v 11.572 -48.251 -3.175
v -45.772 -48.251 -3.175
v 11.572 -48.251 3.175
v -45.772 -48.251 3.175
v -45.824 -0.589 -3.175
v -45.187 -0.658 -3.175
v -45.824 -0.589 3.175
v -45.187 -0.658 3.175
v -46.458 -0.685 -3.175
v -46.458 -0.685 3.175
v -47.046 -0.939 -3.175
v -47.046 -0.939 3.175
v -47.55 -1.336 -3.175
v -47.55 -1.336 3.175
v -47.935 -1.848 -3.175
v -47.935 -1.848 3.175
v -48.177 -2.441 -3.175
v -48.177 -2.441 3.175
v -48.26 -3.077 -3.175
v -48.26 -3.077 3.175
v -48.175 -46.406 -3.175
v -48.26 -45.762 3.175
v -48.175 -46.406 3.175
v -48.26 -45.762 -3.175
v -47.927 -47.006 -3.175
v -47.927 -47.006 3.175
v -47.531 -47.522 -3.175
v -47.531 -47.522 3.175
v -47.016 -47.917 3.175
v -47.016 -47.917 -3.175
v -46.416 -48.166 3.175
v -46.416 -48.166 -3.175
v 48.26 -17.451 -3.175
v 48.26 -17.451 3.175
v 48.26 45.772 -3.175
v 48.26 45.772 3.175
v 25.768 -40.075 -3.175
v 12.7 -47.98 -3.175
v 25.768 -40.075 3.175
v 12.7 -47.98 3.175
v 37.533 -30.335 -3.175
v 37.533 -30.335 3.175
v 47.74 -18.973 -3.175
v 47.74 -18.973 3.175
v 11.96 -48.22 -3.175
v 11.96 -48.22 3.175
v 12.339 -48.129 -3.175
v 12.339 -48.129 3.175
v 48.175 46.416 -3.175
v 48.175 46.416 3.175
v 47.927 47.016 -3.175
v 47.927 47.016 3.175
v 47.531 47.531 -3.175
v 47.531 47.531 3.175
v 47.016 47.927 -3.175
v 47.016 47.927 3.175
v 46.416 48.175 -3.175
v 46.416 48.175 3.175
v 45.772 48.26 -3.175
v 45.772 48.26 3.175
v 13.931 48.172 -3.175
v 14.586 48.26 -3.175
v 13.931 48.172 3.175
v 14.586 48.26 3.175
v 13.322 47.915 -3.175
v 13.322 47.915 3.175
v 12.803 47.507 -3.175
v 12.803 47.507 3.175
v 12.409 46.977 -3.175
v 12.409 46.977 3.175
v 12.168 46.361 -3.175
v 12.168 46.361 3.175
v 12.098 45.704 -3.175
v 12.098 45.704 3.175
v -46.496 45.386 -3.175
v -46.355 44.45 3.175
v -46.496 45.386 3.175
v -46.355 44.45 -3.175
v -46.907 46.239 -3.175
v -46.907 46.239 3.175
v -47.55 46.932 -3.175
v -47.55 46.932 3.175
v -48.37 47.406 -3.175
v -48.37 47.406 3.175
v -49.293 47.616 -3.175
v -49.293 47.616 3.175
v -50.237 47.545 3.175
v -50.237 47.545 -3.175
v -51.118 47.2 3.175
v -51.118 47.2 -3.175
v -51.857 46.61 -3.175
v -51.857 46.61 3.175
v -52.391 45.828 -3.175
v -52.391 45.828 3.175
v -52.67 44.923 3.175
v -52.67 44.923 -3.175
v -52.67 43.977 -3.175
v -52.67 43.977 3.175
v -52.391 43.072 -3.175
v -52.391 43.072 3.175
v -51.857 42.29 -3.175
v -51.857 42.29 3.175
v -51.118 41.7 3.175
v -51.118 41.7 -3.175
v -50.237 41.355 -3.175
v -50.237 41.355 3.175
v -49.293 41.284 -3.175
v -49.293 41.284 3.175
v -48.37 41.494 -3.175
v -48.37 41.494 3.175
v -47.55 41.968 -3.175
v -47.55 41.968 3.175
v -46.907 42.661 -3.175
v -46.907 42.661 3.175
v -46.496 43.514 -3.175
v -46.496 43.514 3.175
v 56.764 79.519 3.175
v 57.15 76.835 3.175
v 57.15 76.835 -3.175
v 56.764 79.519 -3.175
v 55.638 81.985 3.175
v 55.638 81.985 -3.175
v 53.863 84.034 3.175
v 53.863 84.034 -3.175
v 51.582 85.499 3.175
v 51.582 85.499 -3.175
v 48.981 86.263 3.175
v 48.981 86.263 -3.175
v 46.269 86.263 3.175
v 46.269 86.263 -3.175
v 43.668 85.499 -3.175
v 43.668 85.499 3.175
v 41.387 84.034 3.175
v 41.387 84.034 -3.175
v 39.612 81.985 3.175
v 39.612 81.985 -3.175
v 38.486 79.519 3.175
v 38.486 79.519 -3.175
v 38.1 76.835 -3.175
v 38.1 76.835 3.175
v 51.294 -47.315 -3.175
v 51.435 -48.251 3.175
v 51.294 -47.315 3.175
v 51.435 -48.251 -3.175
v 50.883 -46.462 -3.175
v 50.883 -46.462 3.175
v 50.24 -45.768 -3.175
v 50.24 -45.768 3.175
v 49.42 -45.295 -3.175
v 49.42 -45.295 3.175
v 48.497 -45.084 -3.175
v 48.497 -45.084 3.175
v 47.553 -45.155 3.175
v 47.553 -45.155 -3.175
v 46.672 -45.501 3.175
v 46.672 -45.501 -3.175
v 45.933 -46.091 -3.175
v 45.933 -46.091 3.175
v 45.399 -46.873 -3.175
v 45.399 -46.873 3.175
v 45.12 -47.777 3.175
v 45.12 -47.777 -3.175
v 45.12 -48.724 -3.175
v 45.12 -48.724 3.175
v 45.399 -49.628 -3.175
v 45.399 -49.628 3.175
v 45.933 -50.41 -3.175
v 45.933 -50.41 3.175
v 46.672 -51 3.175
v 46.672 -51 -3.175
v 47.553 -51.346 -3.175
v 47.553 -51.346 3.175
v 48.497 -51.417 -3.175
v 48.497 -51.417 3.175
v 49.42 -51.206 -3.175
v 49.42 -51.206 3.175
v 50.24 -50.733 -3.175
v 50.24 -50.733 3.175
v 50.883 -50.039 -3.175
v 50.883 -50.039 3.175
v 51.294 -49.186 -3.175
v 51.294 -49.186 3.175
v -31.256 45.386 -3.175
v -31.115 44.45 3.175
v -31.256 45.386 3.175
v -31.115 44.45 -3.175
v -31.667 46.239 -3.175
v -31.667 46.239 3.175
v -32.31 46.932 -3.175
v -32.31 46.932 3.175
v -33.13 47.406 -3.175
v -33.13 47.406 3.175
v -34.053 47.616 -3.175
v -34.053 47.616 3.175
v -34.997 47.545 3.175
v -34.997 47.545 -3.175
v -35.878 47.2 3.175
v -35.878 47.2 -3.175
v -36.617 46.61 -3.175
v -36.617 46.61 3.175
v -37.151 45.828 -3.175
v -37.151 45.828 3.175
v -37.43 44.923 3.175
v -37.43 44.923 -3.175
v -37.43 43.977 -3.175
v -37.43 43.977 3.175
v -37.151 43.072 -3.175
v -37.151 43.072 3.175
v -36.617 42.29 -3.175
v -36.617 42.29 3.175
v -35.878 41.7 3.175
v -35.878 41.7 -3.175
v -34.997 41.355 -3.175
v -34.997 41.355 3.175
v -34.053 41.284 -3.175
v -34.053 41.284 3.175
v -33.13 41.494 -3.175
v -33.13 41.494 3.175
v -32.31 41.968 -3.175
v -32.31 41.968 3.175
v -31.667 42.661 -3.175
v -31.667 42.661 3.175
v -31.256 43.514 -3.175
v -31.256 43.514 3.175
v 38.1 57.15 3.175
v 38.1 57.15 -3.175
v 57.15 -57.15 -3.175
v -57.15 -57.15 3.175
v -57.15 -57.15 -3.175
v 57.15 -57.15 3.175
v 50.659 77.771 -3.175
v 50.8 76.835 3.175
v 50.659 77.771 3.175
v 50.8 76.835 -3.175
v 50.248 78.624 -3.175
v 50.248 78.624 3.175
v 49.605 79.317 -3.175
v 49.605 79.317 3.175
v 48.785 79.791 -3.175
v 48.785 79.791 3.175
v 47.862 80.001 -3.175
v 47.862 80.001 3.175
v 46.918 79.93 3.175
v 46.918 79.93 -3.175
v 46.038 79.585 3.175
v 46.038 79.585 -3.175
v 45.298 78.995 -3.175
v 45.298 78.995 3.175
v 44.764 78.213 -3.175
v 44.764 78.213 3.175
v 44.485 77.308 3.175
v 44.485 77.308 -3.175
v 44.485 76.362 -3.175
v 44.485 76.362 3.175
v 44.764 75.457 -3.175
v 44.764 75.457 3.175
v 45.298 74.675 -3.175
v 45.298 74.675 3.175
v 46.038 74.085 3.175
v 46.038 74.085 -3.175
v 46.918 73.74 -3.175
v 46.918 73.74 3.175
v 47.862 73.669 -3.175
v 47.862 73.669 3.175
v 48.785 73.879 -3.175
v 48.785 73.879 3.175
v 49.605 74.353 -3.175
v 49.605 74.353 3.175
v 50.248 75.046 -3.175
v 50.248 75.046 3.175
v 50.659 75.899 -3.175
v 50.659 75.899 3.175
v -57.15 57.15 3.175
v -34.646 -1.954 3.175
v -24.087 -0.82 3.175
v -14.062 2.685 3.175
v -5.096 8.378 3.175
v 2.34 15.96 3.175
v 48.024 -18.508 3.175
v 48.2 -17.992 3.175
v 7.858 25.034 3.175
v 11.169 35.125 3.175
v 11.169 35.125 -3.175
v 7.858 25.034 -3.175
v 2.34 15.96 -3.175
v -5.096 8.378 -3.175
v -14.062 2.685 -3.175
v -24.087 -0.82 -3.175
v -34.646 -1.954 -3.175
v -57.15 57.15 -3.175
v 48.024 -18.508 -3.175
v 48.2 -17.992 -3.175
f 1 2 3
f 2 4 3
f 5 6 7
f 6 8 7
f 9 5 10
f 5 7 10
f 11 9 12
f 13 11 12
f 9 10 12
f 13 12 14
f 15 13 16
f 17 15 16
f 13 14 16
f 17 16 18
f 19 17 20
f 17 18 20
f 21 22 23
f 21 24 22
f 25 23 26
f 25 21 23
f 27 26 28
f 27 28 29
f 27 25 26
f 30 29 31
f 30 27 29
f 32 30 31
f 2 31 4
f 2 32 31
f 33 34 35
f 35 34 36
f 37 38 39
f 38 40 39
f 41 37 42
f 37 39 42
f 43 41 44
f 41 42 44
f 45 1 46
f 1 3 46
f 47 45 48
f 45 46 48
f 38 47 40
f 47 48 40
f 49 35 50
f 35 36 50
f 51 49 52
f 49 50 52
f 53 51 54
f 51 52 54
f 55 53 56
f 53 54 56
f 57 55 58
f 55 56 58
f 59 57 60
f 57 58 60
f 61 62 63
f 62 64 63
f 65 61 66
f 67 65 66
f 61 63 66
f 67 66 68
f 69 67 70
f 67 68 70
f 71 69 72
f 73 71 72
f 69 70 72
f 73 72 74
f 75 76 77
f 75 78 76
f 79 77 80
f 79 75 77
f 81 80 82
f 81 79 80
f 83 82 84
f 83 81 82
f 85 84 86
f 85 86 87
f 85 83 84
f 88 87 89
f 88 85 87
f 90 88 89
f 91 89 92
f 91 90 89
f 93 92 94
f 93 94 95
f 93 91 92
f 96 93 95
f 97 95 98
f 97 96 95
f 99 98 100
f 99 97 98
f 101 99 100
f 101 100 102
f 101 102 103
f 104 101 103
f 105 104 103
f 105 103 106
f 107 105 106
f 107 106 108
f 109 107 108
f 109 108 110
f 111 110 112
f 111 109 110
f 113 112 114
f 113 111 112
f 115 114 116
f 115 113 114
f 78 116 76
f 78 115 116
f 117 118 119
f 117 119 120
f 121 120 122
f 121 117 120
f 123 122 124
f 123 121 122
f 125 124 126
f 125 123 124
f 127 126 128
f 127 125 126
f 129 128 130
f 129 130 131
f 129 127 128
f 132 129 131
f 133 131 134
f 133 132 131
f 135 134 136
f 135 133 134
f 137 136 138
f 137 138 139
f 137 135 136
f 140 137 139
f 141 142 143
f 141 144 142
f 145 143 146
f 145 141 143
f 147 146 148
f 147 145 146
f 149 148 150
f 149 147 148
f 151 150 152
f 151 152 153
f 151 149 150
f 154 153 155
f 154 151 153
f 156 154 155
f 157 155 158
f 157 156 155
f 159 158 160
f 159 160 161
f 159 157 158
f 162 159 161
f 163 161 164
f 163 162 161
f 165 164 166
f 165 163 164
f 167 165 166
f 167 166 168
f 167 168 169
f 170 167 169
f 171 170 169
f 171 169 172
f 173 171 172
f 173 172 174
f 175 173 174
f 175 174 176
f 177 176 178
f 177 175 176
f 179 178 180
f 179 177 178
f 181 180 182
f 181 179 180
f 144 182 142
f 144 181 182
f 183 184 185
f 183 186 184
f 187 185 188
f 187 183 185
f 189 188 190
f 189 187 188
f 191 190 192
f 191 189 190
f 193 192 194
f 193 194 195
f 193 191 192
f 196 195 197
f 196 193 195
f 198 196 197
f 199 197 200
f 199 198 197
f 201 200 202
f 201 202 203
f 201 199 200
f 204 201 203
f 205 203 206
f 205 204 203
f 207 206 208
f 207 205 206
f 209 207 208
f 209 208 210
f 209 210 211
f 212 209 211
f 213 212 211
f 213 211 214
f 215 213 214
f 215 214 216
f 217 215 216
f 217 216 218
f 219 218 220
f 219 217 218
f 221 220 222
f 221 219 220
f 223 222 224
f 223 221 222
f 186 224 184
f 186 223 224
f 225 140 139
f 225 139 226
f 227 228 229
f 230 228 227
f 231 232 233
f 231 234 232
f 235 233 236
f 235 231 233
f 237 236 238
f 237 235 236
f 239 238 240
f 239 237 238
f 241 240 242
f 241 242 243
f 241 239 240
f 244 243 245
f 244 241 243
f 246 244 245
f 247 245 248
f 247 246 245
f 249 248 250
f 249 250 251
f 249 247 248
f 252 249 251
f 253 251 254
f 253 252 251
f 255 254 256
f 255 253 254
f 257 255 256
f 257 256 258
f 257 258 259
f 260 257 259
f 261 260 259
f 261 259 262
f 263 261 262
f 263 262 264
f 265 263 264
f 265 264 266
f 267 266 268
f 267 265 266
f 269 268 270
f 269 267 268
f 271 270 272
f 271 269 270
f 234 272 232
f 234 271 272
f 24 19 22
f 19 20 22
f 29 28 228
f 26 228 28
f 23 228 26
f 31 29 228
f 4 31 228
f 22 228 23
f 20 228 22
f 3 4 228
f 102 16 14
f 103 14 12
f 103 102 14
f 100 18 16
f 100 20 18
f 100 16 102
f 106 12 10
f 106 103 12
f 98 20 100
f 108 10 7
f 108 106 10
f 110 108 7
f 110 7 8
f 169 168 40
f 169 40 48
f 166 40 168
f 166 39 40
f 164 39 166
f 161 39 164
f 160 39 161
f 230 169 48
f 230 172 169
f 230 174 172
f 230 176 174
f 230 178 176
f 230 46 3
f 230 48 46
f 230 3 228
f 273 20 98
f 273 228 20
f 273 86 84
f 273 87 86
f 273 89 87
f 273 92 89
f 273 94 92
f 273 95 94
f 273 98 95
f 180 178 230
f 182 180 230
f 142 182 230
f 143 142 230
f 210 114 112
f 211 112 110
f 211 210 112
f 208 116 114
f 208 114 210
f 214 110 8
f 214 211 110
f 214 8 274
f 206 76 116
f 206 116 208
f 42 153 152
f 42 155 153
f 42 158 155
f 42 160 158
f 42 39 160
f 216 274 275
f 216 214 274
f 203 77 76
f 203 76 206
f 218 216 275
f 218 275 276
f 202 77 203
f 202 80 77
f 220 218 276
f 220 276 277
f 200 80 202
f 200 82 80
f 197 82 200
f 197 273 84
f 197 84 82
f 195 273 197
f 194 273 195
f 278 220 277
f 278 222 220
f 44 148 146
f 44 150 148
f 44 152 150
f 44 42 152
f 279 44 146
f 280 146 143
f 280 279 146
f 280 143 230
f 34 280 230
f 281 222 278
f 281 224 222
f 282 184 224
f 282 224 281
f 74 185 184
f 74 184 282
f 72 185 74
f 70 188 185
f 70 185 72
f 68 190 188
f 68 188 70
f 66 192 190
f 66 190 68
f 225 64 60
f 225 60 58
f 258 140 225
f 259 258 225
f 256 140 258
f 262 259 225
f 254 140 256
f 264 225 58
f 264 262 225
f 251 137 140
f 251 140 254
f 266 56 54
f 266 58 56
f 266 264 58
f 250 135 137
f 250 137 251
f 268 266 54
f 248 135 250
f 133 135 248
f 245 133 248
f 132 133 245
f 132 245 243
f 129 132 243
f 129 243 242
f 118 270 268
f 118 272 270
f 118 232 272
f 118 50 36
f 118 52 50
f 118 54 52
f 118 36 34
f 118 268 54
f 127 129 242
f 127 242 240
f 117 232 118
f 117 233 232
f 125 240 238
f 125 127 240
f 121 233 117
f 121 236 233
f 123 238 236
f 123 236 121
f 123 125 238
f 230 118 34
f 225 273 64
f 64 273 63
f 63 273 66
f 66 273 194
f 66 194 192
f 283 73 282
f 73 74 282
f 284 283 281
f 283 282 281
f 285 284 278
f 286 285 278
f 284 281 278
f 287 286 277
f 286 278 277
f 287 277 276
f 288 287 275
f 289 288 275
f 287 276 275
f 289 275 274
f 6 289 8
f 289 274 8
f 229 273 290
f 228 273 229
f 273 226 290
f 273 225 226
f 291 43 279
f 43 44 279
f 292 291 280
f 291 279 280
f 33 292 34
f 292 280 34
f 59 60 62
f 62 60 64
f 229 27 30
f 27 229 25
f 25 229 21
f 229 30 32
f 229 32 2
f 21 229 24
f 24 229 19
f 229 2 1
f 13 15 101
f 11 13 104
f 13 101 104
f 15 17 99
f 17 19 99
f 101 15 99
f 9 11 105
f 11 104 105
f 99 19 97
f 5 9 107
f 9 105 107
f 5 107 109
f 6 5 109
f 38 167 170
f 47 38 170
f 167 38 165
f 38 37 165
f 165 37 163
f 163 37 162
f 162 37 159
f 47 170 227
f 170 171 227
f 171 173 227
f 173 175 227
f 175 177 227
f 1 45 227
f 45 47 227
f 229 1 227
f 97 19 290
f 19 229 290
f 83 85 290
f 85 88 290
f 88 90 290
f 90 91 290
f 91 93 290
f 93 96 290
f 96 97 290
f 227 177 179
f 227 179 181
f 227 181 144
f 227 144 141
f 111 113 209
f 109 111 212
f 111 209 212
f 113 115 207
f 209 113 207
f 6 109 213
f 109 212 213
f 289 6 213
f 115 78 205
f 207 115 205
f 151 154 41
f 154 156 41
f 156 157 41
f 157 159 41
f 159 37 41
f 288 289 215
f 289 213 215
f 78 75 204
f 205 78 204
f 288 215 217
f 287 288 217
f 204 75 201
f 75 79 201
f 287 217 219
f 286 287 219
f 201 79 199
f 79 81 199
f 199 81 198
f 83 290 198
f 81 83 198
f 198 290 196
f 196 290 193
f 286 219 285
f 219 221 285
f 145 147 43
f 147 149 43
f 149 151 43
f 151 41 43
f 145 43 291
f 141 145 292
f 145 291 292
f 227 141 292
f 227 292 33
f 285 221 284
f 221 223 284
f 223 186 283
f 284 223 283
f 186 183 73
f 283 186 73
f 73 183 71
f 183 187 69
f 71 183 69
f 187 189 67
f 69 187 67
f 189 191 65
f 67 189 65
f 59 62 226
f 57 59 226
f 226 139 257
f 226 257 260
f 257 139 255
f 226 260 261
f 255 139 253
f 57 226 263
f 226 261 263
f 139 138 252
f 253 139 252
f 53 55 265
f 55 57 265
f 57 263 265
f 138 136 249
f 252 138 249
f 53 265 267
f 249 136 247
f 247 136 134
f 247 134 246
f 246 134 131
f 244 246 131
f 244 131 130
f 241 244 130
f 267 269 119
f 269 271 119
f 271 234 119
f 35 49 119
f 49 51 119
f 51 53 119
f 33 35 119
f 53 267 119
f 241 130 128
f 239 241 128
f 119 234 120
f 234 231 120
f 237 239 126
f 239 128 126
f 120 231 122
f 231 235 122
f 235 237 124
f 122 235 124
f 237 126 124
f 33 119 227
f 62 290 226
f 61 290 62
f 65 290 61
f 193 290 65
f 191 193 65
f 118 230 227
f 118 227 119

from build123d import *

# Parameters (mm, degrees)
SKETCH1_R           = 3.175
BOSS_EXTRUDE1_DEPTH = 3.175


with BuildPart() as part:
    # Sketch1 → Boss-Extrude1 (new, symmetric)
    with BuildSketch(Plane.XY):
        with BuildLine():
            Line((-57.15, -57.15), (57.15, -57.15))
            Line((57.15, -57.15), (57.15, 76.835))
            ThreePointArc((57.15, 76.835), (47.625, 86.36), (38.1, 76.835))
            Line((38.1, 76.835), (38.1, 57.15))
            Line((38.1, 57.15), (-57.15, 57.15))
            Line((-57.15, 57.15), (-57.15, -57.15))
        make_face()
        with Locations((-49.53, 44.45)):
            Circle(SKETCH1_R, mode=Mode.SUBTRACT)
        with Locations((-34.29, 44.45)):
            Circle(SKETCH1_R, mode=Mode.SUBTRACT)
        with Locations((48.26, -48.25058611)):
            Circle(SKETCH1_R, mode=Mode.SUBTRACT)
        with Locations((47.625, 76.835)):
            Circle(SKETCH1_R, mode=Mode.SUBTRACT)
        with BuildLine():
            Line((-45.77152391, -48.25058611), (11.571822448, -48.25058611))
            ThreePointArc((11.571822448, -48.25058611), (12.151642643, -48.182093861), (12.69954516, -47.980387445))
            ThreePointArc((12.69954516, -47.980387445), (31.830233088, -35.421826409), (47.740202739, -18.972706629))
            ThreePointArc((47.740202739, -18.972706629), (48.126468012, -18.254805898), (48.26, -17.450597264))
            Line((48.26, -17.450597264), (48.26, 45.77152391))
            ThreePointArc((48.26, 45.77152391), (47.531142228, 47.531142228), (45.77152391, 48.26))
            Line((45.77152391, 48.26), (14.585930721, 48.26))
            ThreePointArc((14.585930721, 48.26), (12.802691065, 47.50719945), (12.09836376, 45.704264235))
            ThreePointArc((12.09836376, 45.704264235), (-5.096432418, 8.378001401), (-45.187165534, -0.657707262))
            ThreePointArc((-45.187165534, -0.657707262), (-47.310736599, -1.121263606), (-48.26, -3.076599268))
            Line((-48.26, -3.076599268), (-48.26, -45.76211002))
            ThreePointArc((-48.26, -45.76211002), (-47.531142228, -47.521728338), (-45.77152391, -48.25058611))
        make_face(mode=Mode.SUBTRACT)
    extrude(amount=BOSS_EXTRUDE1_DEPTH, both=True)


solid = part.part
